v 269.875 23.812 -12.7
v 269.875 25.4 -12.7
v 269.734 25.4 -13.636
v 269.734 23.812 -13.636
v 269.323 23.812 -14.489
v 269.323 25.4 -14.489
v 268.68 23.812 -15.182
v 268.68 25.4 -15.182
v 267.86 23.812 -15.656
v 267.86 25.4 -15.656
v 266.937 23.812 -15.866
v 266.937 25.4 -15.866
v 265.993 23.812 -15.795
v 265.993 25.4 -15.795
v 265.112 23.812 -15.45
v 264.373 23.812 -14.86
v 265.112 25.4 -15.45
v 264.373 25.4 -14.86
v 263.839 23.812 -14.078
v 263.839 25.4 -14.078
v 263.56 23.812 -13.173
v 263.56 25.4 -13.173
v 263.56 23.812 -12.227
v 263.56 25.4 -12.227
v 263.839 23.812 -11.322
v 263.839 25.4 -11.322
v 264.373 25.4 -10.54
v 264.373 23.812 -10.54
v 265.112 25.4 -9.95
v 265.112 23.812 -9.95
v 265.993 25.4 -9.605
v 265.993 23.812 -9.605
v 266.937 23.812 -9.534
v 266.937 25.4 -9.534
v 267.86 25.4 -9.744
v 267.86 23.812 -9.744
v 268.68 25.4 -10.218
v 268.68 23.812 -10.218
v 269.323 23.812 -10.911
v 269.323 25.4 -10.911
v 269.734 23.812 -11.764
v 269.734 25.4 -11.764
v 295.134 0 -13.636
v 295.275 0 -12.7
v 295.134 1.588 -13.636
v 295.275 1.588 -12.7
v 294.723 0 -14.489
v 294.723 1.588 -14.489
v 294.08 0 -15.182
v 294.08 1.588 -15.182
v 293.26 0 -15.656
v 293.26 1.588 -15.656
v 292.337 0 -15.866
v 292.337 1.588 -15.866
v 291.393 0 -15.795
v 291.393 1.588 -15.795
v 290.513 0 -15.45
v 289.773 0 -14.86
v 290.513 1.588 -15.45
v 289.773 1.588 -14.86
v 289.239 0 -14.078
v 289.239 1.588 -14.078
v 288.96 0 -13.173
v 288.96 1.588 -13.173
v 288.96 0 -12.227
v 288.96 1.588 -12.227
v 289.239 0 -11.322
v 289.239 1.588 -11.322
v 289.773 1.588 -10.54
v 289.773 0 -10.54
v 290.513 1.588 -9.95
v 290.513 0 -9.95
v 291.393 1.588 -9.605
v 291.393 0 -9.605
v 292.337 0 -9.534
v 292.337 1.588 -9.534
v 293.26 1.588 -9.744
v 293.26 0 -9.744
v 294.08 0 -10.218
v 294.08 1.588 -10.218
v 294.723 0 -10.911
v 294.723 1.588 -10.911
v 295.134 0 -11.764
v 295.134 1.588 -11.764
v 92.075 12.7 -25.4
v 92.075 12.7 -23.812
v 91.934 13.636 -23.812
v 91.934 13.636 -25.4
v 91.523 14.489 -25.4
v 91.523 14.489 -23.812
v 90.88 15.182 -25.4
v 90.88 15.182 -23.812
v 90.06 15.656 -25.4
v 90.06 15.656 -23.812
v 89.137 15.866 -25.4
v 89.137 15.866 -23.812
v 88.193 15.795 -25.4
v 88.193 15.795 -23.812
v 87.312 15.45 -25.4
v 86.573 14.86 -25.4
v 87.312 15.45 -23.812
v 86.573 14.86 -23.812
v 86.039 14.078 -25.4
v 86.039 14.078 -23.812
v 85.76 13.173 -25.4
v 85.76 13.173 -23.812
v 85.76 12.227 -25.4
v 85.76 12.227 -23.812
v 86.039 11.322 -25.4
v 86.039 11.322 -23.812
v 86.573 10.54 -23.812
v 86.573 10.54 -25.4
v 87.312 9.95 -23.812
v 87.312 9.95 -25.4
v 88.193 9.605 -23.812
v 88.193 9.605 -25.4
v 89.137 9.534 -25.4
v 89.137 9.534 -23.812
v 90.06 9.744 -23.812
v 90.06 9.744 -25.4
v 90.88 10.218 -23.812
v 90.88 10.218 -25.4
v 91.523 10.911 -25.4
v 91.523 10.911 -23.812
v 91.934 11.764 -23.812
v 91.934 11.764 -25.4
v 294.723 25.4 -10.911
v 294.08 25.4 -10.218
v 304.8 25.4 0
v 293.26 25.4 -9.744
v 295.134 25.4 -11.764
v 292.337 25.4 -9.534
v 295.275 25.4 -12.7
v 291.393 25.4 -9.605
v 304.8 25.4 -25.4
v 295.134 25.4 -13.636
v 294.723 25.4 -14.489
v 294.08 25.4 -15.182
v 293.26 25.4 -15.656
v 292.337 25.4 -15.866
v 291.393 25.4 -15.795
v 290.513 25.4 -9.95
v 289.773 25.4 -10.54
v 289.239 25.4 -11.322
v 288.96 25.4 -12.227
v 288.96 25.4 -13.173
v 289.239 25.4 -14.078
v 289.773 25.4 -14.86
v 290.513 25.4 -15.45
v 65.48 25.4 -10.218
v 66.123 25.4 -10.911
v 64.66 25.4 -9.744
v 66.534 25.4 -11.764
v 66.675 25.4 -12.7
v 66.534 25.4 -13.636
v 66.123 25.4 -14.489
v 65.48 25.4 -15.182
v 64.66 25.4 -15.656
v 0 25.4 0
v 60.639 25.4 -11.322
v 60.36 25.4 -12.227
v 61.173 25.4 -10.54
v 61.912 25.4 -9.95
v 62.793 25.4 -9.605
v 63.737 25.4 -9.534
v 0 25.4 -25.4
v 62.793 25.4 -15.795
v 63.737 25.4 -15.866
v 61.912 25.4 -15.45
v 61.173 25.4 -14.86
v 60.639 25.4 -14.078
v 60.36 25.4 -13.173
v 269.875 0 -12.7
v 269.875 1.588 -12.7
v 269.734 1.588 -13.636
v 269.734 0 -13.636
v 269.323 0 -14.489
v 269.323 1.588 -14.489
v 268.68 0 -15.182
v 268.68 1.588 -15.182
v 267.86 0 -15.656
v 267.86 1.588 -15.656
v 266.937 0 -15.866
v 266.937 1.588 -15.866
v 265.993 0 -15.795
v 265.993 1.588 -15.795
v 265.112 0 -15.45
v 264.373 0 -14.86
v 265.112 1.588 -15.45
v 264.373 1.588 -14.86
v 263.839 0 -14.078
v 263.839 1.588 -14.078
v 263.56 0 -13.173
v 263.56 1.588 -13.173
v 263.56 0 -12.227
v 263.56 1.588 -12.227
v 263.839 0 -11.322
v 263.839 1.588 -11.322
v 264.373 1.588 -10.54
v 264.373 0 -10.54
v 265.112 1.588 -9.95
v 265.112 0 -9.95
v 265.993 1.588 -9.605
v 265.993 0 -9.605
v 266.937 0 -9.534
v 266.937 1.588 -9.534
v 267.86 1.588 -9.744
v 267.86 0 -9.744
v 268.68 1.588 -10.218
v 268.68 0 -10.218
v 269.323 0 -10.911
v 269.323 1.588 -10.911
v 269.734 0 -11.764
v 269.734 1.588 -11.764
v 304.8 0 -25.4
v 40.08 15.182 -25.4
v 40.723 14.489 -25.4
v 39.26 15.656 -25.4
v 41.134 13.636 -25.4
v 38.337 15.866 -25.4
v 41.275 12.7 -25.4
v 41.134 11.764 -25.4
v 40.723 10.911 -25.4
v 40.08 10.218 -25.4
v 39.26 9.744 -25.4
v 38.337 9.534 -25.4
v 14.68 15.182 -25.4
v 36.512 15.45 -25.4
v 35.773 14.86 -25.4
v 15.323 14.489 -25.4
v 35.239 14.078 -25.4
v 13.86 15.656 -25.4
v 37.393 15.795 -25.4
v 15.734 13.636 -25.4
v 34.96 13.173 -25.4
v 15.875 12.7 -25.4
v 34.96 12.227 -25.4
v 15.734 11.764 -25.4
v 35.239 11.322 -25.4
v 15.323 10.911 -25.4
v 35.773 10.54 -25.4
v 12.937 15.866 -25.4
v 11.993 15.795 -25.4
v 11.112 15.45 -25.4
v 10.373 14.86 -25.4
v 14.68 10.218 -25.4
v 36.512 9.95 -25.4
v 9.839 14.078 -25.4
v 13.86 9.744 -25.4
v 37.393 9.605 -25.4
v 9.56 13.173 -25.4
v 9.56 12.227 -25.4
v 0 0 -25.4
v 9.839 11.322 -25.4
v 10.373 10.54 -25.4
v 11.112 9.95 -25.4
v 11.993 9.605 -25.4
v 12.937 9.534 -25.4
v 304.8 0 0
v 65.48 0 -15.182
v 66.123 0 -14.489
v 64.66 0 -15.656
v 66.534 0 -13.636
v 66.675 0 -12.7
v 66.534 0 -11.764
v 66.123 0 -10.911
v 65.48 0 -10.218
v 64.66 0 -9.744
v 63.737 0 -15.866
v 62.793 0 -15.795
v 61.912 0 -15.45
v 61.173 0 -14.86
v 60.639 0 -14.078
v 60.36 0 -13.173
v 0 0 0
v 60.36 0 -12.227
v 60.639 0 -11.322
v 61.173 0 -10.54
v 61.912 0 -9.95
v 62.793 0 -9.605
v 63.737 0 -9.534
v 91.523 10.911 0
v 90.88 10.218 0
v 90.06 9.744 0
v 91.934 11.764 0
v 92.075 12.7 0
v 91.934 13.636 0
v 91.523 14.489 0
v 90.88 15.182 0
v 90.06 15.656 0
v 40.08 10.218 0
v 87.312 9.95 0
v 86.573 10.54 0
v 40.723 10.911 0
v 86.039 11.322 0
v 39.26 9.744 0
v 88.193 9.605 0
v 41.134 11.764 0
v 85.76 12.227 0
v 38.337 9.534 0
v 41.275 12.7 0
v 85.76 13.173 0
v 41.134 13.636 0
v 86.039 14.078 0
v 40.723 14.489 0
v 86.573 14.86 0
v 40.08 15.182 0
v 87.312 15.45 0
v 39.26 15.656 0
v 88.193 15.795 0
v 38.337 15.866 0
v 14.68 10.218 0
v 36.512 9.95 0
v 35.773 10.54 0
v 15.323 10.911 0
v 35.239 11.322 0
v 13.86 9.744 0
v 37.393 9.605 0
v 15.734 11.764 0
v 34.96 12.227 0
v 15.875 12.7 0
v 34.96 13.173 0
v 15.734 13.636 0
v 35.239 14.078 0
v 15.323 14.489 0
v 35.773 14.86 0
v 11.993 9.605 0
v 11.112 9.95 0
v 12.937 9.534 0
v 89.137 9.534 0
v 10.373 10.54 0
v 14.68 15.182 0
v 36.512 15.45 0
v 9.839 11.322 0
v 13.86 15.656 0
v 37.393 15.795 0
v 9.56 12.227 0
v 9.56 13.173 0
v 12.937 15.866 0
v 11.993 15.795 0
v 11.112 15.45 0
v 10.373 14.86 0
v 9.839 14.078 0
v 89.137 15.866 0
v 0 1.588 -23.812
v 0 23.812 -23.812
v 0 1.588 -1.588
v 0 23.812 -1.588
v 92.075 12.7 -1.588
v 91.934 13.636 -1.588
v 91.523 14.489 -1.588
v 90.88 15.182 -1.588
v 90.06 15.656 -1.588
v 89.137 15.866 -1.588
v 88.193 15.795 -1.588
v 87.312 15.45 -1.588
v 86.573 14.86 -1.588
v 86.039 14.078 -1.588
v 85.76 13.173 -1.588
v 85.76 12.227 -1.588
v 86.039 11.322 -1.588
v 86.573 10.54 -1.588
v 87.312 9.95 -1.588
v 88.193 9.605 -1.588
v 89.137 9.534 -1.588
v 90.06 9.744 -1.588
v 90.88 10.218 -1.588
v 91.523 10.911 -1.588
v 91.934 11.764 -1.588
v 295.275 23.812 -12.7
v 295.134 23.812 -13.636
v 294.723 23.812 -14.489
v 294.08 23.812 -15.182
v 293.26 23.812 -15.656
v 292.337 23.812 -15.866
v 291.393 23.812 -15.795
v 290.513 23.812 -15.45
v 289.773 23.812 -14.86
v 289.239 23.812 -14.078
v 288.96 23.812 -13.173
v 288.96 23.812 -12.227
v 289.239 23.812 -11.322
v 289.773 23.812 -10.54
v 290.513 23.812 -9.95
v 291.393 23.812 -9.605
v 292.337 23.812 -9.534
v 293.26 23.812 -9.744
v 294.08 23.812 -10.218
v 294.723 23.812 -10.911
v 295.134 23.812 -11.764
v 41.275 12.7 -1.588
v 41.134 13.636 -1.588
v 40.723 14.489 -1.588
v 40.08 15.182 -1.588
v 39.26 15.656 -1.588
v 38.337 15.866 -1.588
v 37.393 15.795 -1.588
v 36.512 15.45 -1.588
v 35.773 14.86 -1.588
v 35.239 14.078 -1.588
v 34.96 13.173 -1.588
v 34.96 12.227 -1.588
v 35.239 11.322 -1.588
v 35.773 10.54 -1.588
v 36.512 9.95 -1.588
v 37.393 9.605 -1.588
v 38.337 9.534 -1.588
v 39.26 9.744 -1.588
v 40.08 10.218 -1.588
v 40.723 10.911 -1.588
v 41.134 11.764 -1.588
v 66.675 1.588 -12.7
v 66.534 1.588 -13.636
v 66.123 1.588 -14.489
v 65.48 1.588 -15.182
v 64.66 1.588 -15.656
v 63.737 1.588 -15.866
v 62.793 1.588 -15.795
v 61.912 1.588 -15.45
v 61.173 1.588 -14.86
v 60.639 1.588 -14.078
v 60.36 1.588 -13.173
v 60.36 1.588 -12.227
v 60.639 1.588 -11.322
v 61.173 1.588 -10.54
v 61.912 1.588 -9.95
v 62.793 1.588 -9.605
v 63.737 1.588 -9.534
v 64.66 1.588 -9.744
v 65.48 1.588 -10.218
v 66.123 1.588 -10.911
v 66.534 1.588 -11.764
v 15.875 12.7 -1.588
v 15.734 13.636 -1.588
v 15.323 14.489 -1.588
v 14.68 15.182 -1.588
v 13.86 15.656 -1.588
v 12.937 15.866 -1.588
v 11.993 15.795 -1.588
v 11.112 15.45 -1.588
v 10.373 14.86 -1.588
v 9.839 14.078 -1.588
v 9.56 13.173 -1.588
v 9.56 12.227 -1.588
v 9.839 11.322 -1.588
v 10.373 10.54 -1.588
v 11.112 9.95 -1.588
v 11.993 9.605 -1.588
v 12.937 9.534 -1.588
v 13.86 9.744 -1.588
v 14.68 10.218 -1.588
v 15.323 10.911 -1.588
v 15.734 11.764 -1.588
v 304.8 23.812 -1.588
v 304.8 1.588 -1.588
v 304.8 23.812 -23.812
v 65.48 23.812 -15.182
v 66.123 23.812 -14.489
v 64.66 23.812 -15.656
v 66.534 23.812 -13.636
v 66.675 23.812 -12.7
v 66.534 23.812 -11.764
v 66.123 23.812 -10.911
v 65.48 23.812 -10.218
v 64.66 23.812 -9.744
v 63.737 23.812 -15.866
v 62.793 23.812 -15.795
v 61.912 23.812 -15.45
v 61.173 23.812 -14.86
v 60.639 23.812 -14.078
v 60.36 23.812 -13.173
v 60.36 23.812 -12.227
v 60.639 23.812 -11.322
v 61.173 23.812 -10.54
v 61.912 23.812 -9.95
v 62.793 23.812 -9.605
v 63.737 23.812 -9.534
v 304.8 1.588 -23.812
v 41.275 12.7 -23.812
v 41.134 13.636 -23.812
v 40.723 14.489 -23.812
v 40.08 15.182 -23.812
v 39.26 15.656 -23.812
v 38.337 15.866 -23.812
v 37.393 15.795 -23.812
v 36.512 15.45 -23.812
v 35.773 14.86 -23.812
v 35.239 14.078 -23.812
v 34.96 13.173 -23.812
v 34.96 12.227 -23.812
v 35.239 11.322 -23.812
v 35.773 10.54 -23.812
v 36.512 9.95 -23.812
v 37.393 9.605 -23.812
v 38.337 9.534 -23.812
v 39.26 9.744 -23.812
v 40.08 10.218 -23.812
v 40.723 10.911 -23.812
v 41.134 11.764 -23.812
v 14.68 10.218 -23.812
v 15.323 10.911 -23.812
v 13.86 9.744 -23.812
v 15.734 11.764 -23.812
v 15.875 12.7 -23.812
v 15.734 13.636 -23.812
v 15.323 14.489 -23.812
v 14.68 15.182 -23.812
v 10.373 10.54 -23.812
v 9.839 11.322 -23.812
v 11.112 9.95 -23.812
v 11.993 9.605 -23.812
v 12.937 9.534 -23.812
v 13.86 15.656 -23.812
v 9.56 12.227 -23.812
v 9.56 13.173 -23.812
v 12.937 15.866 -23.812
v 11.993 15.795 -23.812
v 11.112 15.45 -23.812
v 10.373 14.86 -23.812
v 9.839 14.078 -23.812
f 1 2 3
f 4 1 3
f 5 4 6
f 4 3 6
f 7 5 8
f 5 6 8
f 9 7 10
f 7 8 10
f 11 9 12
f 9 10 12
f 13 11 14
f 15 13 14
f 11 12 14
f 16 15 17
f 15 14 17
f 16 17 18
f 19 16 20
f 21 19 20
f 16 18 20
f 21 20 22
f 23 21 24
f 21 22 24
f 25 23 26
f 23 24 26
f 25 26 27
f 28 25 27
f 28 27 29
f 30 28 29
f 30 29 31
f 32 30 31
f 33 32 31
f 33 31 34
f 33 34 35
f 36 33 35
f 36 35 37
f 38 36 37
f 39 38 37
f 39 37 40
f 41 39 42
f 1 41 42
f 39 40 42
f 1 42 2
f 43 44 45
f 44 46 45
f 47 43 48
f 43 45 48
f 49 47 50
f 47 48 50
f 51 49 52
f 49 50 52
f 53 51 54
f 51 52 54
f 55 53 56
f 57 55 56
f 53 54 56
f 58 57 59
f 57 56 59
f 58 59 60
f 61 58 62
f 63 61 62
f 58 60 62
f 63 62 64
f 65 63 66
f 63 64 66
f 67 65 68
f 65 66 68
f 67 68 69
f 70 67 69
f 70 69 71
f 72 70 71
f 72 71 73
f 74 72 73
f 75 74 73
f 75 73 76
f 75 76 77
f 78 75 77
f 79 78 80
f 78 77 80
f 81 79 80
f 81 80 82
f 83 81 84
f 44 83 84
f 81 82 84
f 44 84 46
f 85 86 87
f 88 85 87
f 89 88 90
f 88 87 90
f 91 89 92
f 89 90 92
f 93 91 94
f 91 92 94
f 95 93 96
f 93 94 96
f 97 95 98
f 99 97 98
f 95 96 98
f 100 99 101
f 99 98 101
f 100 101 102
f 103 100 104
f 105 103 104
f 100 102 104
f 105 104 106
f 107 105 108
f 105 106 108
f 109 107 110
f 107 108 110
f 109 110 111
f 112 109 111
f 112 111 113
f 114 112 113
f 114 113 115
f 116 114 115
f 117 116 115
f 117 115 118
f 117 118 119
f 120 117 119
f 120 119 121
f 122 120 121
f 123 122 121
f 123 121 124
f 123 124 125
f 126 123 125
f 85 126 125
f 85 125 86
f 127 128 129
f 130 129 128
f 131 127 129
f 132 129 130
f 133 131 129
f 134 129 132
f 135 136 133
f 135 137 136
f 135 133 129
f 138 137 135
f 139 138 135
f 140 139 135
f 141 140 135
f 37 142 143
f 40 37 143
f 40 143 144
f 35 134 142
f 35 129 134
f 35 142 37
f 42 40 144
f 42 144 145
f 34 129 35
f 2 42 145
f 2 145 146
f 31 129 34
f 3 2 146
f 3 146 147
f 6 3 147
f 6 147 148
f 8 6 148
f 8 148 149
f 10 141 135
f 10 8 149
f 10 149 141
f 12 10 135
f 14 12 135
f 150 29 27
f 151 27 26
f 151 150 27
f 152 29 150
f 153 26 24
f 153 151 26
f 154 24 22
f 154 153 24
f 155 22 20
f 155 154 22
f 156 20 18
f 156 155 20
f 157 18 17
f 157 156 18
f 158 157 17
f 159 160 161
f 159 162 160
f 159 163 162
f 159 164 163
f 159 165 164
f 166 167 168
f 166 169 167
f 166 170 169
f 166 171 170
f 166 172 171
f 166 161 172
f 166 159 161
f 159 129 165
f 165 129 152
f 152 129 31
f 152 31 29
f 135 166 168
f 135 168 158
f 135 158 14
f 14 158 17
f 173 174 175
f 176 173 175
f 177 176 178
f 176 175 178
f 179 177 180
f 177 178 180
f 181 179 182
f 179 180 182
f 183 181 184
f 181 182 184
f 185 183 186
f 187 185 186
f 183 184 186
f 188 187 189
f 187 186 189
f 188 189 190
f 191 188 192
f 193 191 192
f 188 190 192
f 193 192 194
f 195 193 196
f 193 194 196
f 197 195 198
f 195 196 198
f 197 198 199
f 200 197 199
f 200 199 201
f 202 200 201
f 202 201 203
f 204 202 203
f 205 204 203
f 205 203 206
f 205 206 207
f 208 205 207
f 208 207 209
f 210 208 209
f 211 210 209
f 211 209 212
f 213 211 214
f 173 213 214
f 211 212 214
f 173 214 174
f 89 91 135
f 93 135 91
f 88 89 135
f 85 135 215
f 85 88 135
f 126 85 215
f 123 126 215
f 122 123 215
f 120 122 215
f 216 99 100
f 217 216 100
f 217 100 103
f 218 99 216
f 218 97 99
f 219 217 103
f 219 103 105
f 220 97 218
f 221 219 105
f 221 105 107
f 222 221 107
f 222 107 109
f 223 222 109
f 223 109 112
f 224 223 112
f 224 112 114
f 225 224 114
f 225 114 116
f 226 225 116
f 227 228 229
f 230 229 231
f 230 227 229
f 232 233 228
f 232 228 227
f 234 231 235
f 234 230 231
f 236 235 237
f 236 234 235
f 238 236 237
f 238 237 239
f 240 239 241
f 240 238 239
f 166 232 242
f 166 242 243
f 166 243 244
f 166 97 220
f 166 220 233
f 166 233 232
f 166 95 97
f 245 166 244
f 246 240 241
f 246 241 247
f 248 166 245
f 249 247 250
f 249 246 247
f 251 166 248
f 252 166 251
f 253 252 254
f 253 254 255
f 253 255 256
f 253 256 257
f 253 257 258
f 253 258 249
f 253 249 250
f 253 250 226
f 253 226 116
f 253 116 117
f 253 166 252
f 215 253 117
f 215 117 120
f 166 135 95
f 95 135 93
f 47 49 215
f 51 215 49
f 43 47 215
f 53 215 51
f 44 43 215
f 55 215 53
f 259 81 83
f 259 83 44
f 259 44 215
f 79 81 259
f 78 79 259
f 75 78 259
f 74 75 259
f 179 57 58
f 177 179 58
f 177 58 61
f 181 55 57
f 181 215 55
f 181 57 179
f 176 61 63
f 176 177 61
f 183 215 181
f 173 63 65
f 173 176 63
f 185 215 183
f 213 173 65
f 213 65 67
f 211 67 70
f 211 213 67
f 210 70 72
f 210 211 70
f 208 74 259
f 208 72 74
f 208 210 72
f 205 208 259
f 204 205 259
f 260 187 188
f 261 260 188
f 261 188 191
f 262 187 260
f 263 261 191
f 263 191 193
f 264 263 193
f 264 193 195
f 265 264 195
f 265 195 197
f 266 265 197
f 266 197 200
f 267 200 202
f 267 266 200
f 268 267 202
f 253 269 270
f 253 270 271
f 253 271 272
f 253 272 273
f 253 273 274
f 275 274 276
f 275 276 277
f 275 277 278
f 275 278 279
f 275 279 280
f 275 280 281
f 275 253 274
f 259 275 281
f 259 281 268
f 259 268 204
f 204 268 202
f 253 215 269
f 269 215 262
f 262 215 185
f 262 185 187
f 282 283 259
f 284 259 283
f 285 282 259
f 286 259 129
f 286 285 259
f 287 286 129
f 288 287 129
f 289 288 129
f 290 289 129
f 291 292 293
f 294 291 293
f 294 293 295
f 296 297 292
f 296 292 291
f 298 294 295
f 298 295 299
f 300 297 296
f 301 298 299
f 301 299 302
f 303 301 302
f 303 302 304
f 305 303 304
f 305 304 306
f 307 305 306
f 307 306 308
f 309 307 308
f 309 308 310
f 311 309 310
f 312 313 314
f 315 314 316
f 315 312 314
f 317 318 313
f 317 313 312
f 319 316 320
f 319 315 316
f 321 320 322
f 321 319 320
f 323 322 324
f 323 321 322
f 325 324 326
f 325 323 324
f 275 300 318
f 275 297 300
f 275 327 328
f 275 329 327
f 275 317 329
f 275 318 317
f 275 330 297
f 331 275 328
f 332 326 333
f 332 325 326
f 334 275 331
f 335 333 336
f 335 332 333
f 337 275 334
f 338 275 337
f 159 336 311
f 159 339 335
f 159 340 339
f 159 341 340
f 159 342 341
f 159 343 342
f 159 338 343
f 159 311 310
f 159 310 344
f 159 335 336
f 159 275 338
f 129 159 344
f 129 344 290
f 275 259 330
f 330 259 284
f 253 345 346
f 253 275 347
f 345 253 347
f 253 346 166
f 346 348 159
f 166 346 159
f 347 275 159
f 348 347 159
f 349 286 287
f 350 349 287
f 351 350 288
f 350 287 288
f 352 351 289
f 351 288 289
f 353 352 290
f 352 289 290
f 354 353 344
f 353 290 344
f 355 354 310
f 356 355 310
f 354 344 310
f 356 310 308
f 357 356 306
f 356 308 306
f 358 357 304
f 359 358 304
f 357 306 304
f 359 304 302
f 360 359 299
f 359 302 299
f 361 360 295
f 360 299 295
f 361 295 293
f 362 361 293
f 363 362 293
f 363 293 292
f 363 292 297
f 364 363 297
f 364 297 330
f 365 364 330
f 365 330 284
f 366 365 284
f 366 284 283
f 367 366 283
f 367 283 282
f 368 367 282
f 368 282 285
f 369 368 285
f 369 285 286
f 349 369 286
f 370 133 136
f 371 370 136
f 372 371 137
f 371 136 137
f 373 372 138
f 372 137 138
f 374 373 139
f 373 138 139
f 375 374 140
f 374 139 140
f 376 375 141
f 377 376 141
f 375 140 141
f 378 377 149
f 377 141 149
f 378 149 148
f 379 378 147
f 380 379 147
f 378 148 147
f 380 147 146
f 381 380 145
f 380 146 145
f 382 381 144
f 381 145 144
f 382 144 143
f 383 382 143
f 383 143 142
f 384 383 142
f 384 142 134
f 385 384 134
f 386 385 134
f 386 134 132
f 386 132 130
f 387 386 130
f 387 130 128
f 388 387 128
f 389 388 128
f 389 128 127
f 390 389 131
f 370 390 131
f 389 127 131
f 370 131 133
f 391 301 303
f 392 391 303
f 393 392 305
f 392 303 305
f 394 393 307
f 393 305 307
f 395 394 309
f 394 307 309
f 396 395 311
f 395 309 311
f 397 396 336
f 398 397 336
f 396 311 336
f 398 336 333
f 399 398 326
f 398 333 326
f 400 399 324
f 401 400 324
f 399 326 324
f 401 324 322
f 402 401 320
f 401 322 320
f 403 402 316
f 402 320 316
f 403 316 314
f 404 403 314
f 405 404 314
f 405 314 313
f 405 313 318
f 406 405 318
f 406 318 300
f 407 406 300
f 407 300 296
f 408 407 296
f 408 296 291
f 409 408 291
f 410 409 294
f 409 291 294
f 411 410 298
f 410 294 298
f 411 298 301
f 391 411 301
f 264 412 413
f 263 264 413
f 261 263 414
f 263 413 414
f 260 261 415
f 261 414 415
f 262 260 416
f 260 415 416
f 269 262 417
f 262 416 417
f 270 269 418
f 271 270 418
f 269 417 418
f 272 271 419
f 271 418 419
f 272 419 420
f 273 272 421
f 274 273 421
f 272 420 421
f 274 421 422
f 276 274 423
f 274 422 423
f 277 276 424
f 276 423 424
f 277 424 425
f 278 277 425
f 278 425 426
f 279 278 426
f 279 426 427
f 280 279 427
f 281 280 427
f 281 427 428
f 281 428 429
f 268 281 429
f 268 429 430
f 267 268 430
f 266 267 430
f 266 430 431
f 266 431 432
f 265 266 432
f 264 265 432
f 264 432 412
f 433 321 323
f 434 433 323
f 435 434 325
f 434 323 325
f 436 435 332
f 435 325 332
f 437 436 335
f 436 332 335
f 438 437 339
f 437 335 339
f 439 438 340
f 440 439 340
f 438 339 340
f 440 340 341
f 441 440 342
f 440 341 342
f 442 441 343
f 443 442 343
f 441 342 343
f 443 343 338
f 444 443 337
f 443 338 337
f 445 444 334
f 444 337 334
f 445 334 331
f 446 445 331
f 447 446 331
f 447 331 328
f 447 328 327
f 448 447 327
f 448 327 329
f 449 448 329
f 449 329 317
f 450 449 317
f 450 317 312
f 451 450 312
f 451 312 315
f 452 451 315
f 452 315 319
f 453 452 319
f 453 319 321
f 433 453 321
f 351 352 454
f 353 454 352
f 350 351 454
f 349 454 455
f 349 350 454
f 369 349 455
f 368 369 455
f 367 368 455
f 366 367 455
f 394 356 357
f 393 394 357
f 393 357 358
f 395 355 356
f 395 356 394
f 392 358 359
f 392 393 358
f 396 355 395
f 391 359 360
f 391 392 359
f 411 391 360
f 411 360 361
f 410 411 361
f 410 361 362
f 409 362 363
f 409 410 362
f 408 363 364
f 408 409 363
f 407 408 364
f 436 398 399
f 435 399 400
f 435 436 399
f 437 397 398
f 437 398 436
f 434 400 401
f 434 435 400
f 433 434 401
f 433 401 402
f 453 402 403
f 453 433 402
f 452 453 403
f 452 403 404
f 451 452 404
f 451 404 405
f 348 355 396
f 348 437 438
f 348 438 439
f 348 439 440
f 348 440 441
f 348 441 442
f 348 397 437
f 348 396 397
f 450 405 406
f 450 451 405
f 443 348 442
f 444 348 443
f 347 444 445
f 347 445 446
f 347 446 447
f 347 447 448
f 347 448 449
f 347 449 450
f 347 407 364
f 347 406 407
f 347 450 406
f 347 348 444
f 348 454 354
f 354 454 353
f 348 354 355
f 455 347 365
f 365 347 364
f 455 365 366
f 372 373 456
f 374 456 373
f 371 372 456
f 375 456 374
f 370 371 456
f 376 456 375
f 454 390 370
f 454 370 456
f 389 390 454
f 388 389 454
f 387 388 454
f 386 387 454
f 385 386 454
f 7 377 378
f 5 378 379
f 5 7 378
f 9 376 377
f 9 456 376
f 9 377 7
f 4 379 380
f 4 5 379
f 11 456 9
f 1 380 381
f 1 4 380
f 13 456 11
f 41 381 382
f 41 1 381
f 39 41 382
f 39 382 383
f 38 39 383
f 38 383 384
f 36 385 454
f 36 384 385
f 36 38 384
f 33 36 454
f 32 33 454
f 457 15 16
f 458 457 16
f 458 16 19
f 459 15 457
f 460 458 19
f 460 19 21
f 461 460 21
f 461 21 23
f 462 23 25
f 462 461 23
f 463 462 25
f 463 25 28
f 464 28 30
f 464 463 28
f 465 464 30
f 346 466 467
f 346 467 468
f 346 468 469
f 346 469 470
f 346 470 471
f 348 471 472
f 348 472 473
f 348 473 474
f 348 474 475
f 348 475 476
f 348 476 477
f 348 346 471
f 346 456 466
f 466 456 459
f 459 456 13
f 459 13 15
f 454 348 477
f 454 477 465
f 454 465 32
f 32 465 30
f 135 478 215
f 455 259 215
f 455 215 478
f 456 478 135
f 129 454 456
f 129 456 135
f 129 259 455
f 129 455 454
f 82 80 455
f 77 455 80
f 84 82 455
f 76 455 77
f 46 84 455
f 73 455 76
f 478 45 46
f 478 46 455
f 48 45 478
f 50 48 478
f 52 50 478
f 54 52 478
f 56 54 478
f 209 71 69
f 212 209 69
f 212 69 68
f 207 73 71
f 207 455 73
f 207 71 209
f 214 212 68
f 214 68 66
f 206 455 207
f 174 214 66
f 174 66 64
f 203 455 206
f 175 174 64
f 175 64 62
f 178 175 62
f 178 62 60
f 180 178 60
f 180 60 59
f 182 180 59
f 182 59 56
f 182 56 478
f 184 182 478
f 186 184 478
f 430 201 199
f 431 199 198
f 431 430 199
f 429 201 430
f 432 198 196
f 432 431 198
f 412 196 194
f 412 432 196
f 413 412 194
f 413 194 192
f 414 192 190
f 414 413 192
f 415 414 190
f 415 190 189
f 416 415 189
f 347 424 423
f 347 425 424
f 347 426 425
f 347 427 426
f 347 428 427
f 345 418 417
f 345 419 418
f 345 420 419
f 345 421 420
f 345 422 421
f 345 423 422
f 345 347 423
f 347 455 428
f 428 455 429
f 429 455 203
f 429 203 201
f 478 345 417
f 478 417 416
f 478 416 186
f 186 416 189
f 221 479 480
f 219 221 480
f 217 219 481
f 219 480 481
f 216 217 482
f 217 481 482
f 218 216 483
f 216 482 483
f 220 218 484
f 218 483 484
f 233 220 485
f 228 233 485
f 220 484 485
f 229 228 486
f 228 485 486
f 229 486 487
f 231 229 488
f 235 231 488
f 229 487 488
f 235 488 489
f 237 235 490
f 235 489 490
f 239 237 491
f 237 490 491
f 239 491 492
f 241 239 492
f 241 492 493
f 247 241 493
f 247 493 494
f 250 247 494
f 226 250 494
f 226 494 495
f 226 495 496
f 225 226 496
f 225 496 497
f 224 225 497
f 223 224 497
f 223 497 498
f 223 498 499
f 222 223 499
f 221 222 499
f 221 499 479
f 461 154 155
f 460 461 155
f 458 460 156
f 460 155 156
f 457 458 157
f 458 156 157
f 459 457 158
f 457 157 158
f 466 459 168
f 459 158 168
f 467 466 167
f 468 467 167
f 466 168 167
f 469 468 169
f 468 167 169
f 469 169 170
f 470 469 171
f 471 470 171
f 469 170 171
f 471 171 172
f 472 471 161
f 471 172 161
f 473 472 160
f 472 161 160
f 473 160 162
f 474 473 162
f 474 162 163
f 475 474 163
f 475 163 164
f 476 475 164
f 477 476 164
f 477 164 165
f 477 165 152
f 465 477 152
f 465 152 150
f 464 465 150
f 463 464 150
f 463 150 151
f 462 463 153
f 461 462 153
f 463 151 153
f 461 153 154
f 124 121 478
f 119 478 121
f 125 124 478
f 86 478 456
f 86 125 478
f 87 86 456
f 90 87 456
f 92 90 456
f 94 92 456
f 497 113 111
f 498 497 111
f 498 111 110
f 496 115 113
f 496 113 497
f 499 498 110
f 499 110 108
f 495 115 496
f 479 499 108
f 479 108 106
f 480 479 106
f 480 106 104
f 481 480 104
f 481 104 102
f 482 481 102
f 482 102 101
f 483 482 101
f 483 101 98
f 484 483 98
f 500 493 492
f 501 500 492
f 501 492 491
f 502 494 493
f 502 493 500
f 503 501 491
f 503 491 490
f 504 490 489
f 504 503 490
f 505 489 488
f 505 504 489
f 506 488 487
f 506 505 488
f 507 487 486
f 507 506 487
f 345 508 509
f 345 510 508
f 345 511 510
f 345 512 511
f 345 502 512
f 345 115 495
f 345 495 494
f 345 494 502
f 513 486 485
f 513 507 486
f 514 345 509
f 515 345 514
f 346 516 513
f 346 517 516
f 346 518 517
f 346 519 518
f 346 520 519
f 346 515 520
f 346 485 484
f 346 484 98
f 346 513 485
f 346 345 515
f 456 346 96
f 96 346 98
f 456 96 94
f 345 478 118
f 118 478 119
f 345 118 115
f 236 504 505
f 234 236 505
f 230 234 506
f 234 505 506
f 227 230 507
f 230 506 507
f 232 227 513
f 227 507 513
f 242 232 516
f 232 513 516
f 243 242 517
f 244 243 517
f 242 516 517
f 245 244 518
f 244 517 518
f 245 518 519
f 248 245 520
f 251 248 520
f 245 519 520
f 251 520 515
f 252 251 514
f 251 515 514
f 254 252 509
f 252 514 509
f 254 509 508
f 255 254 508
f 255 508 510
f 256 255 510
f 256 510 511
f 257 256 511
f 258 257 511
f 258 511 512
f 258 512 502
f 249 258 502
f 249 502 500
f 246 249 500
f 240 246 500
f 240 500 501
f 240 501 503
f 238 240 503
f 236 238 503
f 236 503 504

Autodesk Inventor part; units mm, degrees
ref_plane "YZ Plane" through (0, 0, 0) normal (1, 0, 0) x (0, 1, 0)
ref_plane "XZ Plane" through (0, 0, 0) normal (0, 1, 0) x (-1, 0, 0)
ref_plane "XY Plane" through (0, 0, 0) normal (0, 0, 1) x (1, 0, 0)
sketch "Sketch1" plane through (0, 0, 0) normal (1, 0, 0) x (0, 1, 0)
  line L0 (0, 0) -> (25.4, 0)
  line L1 (25.4, 0) -> (25.4, -25.4)
  line L2 (25.4, -25.4) -> (0, -25.4)
  line L3 (0, -25.4) -> (0, 0)
  line L4 (23.8125, -23.8125) -> (23.8125, -1.5875)
  line L5 (23.8125, -1.5875) -> (1.5875, -1.5875)
  line L6 (1.5875, -1.5875) -> (1.5875, -23.8125)
  line L7 (1.5875, -23.8125) -> (23.8125, -23.8125)
  dimension "d0" = 25.4
  dimension "d1" = 25.4
  dimension "d2" = 1.5875
extrude "Extrusion1" add sketch "Sketch1" along normal blind 304.8
sketch "Sketch2" plane through (0, 25.4, 0) normal (0, 1, 0) x (1, 0, 0)
  line L0 (304.8, 1.5875) -> (304.8, 23.8125) projected
  line L1 (304.8, 12.7) -> (279.4, 12.7) construction
  circle A0 centre (292.1, 12.7) radius 3.175
  line L2 (304.8, 25.4) -> (304.8, 0) projected
  circle A1 centre (266.7, 12.7) radius 3.175
  circle A2 centre (63.5, 12.7) radius 3.175
  line L3 (0, 0) -> (0, 25.4) projected
  dimension "d5" = 6.35
  dimension "d6" = 12.7
  dimension "d9" = 38.1
  dimension "d15" = 63.5
extrude "Extrusion2" cut sketch "Sketch2" against normal blind 25.4
sketch "Sketch3" plane through (0, 0, 0) normal (0, 0, 1) x (1, 0, 0)
  line L0 (0, 0) -> (0, 25.4) projected
  line L1 (0, 12.7) -> (67.237, 12.7) construction
  circle A0 centre (12.7, 12.7) radius 3.175
  circle A1 centre (38.1, 12.7) radius 3.175
  circle A2 centre (88.9, 12.7) radius 3.175
  dimension "d10" = 6.35
  dimension "d11" = 12.7
  dimension "d12" = 38.1
  dimension "d16" = 88.9
extrude "Extrusion3" cut sketch "Sketch3" against normal blind 88.9
sketch "Sketch4" plane through (0, 25.4, 0) normal (0, 1, 0) x (1, 0, 0)
  point P0 (0, 0)
equation "\"d13\" = d16"
properties part number "Vertical"
